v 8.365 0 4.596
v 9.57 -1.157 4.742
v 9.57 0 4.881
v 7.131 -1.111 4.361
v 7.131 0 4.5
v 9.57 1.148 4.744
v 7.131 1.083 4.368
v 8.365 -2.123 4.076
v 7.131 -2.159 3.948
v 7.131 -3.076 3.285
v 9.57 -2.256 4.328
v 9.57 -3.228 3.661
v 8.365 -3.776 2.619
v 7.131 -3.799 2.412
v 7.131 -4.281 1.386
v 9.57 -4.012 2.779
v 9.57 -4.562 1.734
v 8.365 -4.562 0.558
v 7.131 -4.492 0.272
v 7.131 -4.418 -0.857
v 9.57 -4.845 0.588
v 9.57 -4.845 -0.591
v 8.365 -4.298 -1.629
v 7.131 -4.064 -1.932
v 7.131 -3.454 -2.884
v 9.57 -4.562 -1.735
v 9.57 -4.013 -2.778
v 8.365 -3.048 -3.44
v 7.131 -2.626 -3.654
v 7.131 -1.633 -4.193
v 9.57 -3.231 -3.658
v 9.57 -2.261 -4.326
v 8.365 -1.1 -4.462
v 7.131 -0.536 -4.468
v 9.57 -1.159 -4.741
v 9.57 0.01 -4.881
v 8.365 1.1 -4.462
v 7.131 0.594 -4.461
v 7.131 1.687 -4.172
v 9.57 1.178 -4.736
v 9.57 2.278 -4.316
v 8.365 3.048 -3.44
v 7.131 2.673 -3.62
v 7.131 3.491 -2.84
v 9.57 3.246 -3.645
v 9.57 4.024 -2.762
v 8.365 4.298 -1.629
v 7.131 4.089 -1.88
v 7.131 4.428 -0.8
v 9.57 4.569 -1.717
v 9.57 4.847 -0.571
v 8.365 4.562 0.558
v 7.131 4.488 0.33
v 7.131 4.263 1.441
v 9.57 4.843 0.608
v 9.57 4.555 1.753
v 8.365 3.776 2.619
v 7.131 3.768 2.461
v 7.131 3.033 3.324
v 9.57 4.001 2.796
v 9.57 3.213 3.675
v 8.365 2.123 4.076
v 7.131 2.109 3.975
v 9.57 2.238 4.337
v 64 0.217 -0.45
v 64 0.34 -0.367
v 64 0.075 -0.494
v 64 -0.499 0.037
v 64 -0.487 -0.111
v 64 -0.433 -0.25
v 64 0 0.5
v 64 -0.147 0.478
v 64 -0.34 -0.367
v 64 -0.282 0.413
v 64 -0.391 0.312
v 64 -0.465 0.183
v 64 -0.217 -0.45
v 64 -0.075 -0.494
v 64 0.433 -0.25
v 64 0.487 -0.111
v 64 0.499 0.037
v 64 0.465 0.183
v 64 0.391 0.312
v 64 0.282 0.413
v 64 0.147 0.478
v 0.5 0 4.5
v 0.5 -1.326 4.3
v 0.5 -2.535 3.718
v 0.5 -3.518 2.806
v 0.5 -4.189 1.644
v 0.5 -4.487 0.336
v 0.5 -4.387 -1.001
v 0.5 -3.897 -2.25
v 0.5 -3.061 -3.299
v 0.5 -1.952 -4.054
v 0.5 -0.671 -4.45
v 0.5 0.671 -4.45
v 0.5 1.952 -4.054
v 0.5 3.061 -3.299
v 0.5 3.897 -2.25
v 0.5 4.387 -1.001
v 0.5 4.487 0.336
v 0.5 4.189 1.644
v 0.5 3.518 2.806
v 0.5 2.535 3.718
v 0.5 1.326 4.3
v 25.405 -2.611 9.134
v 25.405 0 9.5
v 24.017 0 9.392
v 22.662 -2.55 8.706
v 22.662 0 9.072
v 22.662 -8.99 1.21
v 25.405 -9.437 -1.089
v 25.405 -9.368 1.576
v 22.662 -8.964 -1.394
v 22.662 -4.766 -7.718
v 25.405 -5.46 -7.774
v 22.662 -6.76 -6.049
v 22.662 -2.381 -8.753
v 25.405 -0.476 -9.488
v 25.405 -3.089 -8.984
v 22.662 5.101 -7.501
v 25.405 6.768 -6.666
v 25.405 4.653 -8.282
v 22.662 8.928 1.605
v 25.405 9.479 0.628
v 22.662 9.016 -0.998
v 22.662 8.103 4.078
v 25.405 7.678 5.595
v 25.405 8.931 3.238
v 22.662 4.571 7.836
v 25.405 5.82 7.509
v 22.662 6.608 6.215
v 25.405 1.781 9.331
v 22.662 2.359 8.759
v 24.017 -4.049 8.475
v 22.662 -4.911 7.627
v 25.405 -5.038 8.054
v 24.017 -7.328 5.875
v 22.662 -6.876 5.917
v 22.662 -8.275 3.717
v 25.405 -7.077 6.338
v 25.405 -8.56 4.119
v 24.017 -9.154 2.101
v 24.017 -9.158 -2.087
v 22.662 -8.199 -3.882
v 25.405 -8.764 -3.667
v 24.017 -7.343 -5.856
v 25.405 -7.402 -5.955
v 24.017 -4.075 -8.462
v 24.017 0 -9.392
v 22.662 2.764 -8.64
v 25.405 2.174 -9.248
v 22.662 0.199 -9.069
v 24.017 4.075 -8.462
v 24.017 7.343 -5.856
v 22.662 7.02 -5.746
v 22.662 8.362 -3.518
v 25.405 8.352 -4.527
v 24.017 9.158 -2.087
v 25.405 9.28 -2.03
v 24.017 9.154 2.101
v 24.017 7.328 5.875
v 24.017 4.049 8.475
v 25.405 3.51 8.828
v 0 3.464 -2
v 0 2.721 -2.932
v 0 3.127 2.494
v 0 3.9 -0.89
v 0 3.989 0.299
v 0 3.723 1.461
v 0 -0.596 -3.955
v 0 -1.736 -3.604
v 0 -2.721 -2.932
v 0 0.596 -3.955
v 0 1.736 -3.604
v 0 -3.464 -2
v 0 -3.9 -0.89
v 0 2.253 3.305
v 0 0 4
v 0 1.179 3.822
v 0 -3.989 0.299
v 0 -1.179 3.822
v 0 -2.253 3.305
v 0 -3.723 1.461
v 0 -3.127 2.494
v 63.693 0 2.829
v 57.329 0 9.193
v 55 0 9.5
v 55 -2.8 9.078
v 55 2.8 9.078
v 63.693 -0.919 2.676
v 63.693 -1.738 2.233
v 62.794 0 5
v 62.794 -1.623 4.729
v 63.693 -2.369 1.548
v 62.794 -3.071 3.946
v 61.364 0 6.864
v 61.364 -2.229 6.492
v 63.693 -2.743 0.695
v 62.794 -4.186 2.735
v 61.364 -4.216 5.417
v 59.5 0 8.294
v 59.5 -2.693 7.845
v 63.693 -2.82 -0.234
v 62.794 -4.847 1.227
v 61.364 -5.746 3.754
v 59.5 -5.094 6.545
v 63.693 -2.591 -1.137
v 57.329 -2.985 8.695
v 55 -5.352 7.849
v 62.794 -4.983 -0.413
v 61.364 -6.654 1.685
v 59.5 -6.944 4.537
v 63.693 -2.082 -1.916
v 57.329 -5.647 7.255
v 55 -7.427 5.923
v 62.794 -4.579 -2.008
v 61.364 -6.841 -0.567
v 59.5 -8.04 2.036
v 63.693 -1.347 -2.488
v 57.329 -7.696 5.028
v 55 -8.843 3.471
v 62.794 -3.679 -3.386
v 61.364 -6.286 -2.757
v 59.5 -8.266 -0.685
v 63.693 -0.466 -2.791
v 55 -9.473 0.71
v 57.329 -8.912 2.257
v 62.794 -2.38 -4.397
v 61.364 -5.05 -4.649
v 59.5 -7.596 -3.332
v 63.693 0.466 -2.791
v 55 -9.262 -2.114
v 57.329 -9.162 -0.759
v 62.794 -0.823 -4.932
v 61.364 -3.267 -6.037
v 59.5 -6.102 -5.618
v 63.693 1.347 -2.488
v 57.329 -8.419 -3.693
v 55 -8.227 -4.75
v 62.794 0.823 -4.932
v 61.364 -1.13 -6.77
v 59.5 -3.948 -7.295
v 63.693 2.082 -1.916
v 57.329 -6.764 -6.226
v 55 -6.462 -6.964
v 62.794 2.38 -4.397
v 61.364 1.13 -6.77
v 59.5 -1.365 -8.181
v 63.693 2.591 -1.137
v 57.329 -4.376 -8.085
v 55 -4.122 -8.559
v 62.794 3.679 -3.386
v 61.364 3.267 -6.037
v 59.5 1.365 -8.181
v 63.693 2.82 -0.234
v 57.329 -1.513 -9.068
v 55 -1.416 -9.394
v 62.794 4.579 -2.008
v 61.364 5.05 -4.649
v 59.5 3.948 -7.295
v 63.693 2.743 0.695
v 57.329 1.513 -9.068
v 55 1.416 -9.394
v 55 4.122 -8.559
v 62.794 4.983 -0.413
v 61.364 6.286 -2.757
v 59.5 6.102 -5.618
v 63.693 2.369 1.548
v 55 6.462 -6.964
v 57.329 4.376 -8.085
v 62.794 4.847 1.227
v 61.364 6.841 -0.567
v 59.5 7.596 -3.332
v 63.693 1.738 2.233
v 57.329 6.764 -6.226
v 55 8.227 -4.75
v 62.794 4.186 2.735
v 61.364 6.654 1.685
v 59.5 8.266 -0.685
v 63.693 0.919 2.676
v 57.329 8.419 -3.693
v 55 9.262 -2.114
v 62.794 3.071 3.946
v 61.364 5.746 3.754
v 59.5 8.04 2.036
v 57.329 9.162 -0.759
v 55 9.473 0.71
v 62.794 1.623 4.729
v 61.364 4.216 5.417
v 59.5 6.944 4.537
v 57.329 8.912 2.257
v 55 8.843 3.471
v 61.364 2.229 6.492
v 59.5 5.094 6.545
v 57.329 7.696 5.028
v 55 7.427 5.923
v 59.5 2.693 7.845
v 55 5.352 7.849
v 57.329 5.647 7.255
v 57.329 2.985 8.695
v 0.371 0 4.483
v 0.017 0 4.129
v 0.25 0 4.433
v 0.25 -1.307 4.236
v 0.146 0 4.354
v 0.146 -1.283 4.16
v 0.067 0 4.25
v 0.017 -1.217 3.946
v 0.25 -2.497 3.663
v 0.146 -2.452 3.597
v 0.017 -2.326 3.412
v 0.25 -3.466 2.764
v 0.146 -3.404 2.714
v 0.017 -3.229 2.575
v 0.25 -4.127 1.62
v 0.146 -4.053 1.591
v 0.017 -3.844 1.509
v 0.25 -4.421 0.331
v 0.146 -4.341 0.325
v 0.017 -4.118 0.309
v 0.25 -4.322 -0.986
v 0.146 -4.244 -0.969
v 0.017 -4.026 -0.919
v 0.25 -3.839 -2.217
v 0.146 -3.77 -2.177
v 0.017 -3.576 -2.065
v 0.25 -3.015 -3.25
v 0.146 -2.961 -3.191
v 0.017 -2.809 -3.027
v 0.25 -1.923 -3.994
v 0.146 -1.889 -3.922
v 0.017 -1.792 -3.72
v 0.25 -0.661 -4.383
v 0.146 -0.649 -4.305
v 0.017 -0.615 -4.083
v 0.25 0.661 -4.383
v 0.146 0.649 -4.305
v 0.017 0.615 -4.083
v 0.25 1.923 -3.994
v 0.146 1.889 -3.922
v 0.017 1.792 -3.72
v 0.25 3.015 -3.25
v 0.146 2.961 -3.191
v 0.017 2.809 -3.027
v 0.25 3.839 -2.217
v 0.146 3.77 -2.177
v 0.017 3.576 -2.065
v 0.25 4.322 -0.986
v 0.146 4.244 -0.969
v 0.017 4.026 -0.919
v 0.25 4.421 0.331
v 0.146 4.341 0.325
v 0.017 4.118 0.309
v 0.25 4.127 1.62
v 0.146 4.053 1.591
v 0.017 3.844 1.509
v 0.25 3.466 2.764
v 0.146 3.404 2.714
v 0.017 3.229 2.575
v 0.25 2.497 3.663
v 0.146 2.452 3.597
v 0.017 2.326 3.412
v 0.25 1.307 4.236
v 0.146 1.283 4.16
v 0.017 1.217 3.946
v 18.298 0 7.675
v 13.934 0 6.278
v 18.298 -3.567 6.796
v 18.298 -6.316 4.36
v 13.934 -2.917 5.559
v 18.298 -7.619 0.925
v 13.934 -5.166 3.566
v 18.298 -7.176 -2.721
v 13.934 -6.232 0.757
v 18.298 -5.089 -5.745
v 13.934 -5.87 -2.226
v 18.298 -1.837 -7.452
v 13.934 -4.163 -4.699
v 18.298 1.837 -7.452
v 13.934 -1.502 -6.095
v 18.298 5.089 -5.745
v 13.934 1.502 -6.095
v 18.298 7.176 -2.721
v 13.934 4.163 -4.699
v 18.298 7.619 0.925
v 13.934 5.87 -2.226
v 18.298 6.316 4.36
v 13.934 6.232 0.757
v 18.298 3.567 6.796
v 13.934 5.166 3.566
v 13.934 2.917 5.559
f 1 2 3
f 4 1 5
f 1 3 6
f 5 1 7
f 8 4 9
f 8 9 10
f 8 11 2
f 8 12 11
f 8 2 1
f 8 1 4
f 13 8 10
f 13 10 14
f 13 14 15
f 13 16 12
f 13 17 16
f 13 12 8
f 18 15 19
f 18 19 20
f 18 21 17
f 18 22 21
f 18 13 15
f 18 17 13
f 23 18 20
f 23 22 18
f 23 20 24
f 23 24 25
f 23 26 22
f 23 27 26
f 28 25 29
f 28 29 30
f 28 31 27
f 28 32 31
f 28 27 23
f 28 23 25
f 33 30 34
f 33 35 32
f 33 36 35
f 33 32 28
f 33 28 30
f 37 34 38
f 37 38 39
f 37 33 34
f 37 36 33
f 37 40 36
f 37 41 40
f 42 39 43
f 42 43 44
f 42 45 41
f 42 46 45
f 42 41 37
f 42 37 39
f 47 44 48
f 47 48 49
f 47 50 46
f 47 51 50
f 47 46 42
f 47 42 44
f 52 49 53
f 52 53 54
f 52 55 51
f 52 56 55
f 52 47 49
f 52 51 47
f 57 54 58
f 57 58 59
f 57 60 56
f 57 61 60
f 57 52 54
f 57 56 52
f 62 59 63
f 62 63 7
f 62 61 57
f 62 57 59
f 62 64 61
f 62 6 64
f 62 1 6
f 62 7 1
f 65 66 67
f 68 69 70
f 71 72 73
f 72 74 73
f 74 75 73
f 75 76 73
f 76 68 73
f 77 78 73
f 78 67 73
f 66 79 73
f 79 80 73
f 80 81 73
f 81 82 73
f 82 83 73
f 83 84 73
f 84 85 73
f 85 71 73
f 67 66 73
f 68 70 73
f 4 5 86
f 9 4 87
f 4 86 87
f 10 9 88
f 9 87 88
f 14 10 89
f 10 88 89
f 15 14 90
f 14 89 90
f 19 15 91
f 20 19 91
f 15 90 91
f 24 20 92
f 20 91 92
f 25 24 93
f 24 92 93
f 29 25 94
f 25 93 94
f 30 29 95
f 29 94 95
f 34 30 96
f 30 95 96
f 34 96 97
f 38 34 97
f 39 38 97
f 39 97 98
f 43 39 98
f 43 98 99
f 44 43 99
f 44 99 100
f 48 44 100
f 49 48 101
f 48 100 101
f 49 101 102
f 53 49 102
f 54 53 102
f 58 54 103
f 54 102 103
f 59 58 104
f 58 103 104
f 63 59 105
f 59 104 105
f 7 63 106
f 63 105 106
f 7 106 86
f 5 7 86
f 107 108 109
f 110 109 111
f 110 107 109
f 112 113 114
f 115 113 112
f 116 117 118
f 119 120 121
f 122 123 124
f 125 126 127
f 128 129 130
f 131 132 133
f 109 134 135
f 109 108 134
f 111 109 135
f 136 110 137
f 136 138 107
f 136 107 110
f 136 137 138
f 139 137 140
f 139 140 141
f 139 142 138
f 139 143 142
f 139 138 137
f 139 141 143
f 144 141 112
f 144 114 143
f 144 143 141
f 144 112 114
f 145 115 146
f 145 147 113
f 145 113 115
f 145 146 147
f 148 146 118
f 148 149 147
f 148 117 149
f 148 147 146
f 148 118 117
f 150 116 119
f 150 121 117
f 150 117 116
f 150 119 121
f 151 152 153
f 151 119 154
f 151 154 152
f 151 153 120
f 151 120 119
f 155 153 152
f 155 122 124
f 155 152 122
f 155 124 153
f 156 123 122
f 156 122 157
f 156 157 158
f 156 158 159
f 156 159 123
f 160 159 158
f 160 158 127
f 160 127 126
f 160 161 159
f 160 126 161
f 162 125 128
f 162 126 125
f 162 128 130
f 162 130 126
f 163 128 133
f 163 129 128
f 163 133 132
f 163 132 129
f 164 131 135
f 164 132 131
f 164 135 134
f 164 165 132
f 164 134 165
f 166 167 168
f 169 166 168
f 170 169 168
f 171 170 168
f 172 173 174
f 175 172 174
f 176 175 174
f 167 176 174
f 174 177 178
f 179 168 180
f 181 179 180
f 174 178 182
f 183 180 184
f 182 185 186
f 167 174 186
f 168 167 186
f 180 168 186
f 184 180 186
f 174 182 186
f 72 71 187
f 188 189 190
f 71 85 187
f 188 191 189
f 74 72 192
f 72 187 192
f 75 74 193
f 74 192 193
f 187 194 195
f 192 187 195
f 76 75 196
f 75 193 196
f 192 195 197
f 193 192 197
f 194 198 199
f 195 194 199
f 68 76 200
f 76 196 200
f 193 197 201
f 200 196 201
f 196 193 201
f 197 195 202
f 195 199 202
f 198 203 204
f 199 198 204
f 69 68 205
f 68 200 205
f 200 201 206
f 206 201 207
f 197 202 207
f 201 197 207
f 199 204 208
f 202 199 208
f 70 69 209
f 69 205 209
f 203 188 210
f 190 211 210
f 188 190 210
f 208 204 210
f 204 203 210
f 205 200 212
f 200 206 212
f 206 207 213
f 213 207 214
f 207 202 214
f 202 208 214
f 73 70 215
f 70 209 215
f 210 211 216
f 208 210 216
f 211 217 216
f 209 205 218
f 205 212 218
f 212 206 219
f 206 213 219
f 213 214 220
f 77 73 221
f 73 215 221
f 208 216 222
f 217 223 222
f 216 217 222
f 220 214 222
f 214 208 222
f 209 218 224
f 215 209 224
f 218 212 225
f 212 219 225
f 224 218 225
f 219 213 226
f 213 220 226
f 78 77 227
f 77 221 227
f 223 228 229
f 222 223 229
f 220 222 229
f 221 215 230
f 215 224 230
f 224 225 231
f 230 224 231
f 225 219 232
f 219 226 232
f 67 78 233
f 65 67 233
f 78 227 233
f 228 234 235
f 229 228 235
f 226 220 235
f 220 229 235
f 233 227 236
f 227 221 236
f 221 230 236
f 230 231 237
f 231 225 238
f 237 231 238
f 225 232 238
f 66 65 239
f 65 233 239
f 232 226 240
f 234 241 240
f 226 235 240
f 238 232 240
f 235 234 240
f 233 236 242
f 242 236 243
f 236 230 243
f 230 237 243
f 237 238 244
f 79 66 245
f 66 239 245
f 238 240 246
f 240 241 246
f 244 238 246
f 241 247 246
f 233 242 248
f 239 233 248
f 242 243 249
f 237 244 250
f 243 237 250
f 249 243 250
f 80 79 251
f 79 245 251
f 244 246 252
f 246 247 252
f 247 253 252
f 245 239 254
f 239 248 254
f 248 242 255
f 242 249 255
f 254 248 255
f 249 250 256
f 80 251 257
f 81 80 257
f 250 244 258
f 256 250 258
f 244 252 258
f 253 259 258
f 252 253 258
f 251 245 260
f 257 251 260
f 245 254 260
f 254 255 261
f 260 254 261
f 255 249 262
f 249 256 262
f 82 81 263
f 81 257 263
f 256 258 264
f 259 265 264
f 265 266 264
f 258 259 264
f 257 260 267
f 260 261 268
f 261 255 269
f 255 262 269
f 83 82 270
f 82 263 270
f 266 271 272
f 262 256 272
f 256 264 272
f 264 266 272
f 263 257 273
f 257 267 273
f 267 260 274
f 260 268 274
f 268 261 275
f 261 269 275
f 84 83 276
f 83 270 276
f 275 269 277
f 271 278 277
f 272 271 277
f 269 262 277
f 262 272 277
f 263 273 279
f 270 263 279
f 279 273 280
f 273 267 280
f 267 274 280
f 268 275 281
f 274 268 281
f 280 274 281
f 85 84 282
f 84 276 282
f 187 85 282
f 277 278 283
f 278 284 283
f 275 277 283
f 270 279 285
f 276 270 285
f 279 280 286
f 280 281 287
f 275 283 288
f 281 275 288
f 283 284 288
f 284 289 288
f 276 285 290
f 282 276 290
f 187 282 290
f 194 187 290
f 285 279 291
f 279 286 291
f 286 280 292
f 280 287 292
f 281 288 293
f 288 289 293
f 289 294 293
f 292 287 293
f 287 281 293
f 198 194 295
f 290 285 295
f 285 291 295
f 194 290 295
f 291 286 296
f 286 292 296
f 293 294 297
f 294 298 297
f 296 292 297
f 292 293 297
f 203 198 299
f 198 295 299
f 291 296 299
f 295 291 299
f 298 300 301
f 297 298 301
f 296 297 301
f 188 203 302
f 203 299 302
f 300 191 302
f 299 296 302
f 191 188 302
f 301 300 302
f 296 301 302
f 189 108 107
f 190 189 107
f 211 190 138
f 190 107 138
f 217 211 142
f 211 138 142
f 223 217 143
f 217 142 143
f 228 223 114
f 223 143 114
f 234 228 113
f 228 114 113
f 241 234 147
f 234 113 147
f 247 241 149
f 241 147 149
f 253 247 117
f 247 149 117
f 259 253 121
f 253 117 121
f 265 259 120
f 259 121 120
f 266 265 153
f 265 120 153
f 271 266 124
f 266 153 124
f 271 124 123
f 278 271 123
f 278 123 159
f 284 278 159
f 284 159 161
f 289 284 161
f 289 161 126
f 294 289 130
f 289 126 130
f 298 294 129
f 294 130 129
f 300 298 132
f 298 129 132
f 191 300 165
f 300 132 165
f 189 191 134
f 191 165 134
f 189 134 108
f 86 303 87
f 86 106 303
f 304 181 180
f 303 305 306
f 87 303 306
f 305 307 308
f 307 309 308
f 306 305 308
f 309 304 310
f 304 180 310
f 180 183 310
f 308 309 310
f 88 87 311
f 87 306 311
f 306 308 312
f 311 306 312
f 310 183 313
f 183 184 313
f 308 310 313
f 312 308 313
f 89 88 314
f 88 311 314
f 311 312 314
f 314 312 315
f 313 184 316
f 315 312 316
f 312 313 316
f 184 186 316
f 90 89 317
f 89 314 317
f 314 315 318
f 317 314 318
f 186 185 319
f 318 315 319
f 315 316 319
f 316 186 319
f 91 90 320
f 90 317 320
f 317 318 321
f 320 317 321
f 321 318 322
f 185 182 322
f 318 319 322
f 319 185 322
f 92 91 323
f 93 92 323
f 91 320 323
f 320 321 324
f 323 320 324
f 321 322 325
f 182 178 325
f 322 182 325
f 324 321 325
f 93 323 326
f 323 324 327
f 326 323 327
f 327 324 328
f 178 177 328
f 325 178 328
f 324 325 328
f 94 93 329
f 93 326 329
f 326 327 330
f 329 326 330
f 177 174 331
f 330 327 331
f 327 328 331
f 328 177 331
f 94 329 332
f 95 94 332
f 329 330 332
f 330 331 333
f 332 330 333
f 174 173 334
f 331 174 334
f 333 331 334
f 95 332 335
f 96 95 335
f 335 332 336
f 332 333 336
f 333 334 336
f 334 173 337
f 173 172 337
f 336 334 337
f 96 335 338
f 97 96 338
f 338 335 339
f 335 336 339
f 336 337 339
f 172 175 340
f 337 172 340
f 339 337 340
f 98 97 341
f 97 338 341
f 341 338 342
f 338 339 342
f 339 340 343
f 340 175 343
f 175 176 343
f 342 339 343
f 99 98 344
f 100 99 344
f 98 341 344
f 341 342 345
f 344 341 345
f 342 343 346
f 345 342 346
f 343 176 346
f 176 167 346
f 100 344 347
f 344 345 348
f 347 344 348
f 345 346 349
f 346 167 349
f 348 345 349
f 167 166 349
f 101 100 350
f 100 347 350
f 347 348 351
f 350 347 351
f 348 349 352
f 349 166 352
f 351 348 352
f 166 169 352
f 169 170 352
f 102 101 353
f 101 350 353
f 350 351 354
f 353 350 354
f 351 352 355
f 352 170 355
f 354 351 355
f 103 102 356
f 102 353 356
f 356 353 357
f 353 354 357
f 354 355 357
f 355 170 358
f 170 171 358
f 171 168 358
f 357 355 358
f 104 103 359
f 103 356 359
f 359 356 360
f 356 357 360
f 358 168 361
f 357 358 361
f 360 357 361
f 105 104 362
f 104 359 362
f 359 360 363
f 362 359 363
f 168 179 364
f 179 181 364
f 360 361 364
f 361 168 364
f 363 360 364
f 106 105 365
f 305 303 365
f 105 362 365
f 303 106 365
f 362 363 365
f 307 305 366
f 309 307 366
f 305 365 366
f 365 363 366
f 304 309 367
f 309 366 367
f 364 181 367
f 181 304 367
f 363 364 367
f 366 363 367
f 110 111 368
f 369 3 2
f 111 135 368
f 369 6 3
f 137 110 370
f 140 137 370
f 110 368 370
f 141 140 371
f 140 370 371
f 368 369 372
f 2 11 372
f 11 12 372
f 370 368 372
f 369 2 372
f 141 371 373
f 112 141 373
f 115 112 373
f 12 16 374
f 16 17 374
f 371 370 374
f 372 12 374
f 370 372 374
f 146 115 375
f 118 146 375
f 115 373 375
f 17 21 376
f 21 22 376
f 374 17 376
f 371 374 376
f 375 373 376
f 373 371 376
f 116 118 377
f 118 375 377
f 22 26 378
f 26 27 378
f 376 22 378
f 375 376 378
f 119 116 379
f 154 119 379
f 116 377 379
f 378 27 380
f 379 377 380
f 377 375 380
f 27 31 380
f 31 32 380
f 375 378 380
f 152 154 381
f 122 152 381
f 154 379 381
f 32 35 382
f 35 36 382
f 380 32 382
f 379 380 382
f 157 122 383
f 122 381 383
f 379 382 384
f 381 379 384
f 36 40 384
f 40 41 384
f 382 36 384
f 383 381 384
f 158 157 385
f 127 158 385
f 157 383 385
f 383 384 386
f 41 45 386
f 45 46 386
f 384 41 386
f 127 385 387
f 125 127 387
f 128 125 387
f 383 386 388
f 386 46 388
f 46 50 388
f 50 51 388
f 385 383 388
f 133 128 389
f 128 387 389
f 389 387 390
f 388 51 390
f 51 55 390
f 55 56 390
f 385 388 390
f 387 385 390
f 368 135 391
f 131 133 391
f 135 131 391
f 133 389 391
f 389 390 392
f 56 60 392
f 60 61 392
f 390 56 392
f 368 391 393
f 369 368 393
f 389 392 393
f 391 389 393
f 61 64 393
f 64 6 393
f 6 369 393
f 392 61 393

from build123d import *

# Parameters (mm, degrees)
F2_R = 9
F3_R = 9
F4_R = 8
F5_R = 0.5


with BuildPart() as f1:
    # F0 (on Front) → F1 (revolve)
    with BuildSketch(Plane.XZ):
        Polygon((0, 4.5), (0, 0), (64, 0), (64, 9.5), (24, 9.5), (8.380214, 4.5), align=None)
    revolve(axis=Axis((32, 0, 0), (1, 0, 0)))

    # F2
    f2_edges = [f1.edges().sort_by_distance(p)[0] for p in [
        (64, 0, -9.5),
    ]]
    fillet(f2_edges, radius=F2_R)

    # F3
    f3_edges = [f1.edges().sort_by_distance(p)[0] for p in [
        (24, 0, -9.5),
    ]]
    fillet(f3_edges, radius=F3_R)

    # F4
    f4_edges = [f1.edges().sort_by_distance(p)[0] for p in [
        (8.380214, 0, -4.5),
    ]]
    fillet(f4_edges, radius=F4_R)

    # F5
    f5_edges = [f1.edges().sort_by_distance(p)[0] for p in [
        (0, 0, -4.5),
    ]]
    fillet(f5_edges, radius=F5_R)


solid = f1.part
